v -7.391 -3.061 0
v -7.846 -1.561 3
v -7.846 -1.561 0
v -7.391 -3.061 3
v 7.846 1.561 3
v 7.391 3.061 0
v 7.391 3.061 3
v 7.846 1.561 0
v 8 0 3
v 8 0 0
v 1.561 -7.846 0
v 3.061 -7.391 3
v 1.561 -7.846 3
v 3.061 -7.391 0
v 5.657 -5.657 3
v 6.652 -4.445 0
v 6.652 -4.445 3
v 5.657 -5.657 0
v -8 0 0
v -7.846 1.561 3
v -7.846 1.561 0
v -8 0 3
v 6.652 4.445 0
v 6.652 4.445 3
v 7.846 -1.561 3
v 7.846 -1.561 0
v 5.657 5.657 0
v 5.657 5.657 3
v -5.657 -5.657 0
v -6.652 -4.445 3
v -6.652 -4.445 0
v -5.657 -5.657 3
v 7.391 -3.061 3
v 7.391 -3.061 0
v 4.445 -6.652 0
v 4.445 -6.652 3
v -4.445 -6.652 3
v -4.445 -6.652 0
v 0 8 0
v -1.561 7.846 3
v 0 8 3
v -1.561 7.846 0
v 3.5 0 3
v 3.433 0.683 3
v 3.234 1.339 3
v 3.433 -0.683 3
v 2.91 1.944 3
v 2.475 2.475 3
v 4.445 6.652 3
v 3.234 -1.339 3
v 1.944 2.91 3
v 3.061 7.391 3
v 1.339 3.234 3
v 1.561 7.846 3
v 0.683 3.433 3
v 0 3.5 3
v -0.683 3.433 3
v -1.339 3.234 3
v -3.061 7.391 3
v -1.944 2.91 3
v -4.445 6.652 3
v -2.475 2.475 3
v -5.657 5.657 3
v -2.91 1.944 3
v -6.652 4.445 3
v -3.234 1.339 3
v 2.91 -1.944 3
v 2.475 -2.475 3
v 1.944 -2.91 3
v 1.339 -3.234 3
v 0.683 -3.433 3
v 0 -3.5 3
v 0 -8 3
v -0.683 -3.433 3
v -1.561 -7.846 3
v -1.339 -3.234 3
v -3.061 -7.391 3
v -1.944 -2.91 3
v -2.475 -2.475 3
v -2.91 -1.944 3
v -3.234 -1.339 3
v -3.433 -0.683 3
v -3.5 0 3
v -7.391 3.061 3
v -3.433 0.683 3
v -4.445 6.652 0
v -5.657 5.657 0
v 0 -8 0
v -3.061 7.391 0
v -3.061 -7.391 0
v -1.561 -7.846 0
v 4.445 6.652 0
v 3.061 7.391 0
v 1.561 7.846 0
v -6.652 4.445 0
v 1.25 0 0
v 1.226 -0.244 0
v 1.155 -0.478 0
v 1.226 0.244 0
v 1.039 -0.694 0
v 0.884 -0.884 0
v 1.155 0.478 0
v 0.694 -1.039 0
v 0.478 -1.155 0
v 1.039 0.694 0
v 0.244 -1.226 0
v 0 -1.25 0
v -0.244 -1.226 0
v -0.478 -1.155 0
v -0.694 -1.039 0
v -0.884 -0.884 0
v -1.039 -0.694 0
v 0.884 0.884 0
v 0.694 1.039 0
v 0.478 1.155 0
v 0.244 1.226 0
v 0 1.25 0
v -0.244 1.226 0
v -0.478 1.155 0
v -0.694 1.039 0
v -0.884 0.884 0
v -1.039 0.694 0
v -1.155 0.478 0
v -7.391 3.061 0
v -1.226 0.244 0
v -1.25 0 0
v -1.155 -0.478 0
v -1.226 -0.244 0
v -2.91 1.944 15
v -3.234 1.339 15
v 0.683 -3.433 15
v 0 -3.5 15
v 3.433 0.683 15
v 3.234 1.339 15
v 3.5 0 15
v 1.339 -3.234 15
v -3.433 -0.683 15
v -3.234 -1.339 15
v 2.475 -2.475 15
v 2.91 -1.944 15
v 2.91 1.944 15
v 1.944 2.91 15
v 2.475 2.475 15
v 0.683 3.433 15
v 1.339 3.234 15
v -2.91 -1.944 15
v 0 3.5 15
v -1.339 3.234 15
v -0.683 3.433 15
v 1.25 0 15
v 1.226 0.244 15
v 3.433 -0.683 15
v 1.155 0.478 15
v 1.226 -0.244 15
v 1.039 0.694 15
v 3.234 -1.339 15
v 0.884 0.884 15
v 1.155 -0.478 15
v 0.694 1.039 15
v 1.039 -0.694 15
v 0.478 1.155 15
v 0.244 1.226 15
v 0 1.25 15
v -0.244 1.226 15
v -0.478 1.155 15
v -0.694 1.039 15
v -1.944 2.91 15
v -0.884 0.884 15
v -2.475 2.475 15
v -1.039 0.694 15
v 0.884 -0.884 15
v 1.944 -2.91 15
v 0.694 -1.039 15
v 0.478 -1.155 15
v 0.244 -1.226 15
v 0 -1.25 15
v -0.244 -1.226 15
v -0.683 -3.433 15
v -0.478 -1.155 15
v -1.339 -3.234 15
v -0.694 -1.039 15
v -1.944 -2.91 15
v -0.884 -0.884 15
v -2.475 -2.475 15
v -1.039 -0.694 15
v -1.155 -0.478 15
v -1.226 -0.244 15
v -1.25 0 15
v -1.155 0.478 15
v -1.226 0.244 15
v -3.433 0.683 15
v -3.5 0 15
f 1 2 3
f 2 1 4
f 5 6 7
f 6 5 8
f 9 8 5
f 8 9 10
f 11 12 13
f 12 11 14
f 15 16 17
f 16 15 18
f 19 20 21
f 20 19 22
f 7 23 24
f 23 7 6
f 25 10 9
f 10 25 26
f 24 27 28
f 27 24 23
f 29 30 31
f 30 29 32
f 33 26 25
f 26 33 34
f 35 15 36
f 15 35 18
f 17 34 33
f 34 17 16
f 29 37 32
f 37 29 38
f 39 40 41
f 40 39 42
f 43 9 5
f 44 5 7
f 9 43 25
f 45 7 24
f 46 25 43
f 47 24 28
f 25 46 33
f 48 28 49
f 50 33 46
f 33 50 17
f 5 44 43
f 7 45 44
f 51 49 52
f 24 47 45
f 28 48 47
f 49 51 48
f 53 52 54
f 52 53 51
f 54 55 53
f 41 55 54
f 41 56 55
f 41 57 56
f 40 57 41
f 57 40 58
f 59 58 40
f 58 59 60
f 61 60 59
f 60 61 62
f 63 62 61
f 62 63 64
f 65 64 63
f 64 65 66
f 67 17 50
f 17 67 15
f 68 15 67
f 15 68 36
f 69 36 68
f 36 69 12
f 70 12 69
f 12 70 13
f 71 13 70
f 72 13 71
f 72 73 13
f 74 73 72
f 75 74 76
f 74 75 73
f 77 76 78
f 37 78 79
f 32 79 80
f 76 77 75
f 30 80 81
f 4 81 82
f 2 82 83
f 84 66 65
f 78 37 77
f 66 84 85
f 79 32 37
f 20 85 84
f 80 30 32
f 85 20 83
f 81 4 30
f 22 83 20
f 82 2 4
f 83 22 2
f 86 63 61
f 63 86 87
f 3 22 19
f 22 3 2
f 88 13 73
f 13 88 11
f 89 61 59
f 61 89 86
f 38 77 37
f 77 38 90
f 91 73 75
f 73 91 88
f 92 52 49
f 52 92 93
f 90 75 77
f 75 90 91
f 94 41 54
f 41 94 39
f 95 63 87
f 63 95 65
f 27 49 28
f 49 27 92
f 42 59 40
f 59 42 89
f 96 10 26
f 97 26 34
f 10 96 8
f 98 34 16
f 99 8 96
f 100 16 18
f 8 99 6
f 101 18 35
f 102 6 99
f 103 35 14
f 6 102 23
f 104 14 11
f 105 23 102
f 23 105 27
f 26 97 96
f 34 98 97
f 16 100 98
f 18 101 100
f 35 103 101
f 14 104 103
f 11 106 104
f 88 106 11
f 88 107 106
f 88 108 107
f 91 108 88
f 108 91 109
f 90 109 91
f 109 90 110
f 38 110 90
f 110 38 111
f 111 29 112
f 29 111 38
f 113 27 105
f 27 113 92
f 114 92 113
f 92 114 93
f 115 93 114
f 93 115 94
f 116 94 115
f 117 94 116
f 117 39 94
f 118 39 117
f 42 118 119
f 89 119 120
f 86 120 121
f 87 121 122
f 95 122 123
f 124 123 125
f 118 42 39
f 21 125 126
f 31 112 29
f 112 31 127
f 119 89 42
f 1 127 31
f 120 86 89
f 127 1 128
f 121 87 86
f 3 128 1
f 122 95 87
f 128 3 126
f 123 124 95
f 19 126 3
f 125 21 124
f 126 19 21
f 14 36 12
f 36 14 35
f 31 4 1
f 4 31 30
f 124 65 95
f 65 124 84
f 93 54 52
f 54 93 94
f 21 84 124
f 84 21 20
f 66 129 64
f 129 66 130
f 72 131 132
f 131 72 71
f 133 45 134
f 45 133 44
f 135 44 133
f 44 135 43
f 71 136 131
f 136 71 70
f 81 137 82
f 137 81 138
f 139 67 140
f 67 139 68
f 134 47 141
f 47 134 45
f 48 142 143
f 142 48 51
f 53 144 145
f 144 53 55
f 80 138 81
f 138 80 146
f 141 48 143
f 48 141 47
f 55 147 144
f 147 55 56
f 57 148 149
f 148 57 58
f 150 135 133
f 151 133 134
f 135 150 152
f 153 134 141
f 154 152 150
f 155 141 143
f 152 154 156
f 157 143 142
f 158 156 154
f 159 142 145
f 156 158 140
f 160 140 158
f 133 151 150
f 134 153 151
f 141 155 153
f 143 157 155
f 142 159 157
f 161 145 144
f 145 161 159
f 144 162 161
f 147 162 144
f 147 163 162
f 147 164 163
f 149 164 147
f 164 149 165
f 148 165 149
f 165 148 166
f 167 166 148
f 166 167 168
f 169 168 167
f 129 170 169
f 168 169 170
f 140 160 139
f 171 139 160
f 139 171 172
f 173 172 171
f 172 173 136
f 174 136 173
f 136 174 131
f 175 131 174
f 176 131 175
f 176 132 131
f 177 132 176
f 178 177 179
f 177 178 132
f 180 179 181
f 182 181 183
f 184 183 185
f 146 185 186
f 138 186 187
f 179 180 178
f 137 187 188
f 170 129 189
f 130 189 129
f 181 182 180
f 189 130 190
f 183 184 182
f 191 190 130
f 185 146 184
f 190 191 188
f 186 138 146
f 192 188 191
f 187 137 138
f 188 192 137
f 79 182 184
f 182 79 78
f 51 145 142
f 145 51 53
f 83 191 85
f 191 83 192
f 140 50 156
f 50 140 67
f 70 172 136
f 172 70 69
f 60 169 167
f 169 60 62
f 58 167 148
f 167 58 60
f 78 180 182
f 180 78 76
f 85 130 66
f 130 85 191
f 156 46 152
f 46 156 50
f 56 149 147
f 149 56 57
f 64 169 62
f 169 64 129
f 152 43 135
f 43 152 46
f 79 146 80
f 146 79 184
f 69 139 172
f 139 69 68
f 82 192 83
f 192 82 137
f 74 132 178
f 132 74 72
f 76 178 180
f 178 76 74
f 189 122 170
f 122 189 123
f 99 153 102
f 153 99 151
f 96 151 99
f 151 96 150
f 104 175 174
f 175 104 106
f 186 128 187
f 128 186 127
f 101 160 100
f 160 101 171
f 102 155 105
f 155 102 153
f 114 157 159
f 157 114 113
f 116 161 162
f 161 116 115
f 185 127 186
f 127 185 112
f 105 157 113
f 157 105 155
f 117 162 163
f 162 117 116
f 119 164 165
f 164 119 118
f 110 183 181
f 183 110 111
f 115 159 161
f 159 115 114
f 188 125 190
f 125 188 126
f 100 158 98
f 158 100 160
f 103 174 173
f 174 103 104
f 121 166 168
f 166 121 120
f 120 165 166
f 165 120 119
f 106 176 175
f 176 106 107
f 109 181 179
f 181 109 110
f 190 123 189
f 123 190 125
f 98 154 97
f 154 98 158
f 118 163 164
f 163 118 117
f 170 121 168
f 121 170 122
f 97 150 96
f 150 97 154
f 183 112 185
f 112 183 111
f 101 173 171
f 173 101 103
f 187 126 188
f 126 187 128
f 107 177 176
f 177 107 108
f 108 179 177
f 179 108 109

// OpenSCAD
$fn = 32;

// ----------------------------------------------------------------------
// Micro post: flanged post, 5-20 mm class
// ----------------------------------------------------------------------

// --- parameters (mm) ---
post_d = 7;               // post diameter
post_h = 12;              // post height above the flange
flange_d = 16;            // flange diameter
flange_t = 3;             // flange thickness
bore_d = 2.5;             // through bore

total_h = post_h + flange_t;  // overall height

difference() {
  union() {
    cylinder(h = flange_t, d = flange_d);
    translate([0, 0, flange_t]) cylinder(h = post_h, d = post_d);
  }
  translate([0, 0, -1]) cylinder(h = total_h + 2, d = bore_d);
}
